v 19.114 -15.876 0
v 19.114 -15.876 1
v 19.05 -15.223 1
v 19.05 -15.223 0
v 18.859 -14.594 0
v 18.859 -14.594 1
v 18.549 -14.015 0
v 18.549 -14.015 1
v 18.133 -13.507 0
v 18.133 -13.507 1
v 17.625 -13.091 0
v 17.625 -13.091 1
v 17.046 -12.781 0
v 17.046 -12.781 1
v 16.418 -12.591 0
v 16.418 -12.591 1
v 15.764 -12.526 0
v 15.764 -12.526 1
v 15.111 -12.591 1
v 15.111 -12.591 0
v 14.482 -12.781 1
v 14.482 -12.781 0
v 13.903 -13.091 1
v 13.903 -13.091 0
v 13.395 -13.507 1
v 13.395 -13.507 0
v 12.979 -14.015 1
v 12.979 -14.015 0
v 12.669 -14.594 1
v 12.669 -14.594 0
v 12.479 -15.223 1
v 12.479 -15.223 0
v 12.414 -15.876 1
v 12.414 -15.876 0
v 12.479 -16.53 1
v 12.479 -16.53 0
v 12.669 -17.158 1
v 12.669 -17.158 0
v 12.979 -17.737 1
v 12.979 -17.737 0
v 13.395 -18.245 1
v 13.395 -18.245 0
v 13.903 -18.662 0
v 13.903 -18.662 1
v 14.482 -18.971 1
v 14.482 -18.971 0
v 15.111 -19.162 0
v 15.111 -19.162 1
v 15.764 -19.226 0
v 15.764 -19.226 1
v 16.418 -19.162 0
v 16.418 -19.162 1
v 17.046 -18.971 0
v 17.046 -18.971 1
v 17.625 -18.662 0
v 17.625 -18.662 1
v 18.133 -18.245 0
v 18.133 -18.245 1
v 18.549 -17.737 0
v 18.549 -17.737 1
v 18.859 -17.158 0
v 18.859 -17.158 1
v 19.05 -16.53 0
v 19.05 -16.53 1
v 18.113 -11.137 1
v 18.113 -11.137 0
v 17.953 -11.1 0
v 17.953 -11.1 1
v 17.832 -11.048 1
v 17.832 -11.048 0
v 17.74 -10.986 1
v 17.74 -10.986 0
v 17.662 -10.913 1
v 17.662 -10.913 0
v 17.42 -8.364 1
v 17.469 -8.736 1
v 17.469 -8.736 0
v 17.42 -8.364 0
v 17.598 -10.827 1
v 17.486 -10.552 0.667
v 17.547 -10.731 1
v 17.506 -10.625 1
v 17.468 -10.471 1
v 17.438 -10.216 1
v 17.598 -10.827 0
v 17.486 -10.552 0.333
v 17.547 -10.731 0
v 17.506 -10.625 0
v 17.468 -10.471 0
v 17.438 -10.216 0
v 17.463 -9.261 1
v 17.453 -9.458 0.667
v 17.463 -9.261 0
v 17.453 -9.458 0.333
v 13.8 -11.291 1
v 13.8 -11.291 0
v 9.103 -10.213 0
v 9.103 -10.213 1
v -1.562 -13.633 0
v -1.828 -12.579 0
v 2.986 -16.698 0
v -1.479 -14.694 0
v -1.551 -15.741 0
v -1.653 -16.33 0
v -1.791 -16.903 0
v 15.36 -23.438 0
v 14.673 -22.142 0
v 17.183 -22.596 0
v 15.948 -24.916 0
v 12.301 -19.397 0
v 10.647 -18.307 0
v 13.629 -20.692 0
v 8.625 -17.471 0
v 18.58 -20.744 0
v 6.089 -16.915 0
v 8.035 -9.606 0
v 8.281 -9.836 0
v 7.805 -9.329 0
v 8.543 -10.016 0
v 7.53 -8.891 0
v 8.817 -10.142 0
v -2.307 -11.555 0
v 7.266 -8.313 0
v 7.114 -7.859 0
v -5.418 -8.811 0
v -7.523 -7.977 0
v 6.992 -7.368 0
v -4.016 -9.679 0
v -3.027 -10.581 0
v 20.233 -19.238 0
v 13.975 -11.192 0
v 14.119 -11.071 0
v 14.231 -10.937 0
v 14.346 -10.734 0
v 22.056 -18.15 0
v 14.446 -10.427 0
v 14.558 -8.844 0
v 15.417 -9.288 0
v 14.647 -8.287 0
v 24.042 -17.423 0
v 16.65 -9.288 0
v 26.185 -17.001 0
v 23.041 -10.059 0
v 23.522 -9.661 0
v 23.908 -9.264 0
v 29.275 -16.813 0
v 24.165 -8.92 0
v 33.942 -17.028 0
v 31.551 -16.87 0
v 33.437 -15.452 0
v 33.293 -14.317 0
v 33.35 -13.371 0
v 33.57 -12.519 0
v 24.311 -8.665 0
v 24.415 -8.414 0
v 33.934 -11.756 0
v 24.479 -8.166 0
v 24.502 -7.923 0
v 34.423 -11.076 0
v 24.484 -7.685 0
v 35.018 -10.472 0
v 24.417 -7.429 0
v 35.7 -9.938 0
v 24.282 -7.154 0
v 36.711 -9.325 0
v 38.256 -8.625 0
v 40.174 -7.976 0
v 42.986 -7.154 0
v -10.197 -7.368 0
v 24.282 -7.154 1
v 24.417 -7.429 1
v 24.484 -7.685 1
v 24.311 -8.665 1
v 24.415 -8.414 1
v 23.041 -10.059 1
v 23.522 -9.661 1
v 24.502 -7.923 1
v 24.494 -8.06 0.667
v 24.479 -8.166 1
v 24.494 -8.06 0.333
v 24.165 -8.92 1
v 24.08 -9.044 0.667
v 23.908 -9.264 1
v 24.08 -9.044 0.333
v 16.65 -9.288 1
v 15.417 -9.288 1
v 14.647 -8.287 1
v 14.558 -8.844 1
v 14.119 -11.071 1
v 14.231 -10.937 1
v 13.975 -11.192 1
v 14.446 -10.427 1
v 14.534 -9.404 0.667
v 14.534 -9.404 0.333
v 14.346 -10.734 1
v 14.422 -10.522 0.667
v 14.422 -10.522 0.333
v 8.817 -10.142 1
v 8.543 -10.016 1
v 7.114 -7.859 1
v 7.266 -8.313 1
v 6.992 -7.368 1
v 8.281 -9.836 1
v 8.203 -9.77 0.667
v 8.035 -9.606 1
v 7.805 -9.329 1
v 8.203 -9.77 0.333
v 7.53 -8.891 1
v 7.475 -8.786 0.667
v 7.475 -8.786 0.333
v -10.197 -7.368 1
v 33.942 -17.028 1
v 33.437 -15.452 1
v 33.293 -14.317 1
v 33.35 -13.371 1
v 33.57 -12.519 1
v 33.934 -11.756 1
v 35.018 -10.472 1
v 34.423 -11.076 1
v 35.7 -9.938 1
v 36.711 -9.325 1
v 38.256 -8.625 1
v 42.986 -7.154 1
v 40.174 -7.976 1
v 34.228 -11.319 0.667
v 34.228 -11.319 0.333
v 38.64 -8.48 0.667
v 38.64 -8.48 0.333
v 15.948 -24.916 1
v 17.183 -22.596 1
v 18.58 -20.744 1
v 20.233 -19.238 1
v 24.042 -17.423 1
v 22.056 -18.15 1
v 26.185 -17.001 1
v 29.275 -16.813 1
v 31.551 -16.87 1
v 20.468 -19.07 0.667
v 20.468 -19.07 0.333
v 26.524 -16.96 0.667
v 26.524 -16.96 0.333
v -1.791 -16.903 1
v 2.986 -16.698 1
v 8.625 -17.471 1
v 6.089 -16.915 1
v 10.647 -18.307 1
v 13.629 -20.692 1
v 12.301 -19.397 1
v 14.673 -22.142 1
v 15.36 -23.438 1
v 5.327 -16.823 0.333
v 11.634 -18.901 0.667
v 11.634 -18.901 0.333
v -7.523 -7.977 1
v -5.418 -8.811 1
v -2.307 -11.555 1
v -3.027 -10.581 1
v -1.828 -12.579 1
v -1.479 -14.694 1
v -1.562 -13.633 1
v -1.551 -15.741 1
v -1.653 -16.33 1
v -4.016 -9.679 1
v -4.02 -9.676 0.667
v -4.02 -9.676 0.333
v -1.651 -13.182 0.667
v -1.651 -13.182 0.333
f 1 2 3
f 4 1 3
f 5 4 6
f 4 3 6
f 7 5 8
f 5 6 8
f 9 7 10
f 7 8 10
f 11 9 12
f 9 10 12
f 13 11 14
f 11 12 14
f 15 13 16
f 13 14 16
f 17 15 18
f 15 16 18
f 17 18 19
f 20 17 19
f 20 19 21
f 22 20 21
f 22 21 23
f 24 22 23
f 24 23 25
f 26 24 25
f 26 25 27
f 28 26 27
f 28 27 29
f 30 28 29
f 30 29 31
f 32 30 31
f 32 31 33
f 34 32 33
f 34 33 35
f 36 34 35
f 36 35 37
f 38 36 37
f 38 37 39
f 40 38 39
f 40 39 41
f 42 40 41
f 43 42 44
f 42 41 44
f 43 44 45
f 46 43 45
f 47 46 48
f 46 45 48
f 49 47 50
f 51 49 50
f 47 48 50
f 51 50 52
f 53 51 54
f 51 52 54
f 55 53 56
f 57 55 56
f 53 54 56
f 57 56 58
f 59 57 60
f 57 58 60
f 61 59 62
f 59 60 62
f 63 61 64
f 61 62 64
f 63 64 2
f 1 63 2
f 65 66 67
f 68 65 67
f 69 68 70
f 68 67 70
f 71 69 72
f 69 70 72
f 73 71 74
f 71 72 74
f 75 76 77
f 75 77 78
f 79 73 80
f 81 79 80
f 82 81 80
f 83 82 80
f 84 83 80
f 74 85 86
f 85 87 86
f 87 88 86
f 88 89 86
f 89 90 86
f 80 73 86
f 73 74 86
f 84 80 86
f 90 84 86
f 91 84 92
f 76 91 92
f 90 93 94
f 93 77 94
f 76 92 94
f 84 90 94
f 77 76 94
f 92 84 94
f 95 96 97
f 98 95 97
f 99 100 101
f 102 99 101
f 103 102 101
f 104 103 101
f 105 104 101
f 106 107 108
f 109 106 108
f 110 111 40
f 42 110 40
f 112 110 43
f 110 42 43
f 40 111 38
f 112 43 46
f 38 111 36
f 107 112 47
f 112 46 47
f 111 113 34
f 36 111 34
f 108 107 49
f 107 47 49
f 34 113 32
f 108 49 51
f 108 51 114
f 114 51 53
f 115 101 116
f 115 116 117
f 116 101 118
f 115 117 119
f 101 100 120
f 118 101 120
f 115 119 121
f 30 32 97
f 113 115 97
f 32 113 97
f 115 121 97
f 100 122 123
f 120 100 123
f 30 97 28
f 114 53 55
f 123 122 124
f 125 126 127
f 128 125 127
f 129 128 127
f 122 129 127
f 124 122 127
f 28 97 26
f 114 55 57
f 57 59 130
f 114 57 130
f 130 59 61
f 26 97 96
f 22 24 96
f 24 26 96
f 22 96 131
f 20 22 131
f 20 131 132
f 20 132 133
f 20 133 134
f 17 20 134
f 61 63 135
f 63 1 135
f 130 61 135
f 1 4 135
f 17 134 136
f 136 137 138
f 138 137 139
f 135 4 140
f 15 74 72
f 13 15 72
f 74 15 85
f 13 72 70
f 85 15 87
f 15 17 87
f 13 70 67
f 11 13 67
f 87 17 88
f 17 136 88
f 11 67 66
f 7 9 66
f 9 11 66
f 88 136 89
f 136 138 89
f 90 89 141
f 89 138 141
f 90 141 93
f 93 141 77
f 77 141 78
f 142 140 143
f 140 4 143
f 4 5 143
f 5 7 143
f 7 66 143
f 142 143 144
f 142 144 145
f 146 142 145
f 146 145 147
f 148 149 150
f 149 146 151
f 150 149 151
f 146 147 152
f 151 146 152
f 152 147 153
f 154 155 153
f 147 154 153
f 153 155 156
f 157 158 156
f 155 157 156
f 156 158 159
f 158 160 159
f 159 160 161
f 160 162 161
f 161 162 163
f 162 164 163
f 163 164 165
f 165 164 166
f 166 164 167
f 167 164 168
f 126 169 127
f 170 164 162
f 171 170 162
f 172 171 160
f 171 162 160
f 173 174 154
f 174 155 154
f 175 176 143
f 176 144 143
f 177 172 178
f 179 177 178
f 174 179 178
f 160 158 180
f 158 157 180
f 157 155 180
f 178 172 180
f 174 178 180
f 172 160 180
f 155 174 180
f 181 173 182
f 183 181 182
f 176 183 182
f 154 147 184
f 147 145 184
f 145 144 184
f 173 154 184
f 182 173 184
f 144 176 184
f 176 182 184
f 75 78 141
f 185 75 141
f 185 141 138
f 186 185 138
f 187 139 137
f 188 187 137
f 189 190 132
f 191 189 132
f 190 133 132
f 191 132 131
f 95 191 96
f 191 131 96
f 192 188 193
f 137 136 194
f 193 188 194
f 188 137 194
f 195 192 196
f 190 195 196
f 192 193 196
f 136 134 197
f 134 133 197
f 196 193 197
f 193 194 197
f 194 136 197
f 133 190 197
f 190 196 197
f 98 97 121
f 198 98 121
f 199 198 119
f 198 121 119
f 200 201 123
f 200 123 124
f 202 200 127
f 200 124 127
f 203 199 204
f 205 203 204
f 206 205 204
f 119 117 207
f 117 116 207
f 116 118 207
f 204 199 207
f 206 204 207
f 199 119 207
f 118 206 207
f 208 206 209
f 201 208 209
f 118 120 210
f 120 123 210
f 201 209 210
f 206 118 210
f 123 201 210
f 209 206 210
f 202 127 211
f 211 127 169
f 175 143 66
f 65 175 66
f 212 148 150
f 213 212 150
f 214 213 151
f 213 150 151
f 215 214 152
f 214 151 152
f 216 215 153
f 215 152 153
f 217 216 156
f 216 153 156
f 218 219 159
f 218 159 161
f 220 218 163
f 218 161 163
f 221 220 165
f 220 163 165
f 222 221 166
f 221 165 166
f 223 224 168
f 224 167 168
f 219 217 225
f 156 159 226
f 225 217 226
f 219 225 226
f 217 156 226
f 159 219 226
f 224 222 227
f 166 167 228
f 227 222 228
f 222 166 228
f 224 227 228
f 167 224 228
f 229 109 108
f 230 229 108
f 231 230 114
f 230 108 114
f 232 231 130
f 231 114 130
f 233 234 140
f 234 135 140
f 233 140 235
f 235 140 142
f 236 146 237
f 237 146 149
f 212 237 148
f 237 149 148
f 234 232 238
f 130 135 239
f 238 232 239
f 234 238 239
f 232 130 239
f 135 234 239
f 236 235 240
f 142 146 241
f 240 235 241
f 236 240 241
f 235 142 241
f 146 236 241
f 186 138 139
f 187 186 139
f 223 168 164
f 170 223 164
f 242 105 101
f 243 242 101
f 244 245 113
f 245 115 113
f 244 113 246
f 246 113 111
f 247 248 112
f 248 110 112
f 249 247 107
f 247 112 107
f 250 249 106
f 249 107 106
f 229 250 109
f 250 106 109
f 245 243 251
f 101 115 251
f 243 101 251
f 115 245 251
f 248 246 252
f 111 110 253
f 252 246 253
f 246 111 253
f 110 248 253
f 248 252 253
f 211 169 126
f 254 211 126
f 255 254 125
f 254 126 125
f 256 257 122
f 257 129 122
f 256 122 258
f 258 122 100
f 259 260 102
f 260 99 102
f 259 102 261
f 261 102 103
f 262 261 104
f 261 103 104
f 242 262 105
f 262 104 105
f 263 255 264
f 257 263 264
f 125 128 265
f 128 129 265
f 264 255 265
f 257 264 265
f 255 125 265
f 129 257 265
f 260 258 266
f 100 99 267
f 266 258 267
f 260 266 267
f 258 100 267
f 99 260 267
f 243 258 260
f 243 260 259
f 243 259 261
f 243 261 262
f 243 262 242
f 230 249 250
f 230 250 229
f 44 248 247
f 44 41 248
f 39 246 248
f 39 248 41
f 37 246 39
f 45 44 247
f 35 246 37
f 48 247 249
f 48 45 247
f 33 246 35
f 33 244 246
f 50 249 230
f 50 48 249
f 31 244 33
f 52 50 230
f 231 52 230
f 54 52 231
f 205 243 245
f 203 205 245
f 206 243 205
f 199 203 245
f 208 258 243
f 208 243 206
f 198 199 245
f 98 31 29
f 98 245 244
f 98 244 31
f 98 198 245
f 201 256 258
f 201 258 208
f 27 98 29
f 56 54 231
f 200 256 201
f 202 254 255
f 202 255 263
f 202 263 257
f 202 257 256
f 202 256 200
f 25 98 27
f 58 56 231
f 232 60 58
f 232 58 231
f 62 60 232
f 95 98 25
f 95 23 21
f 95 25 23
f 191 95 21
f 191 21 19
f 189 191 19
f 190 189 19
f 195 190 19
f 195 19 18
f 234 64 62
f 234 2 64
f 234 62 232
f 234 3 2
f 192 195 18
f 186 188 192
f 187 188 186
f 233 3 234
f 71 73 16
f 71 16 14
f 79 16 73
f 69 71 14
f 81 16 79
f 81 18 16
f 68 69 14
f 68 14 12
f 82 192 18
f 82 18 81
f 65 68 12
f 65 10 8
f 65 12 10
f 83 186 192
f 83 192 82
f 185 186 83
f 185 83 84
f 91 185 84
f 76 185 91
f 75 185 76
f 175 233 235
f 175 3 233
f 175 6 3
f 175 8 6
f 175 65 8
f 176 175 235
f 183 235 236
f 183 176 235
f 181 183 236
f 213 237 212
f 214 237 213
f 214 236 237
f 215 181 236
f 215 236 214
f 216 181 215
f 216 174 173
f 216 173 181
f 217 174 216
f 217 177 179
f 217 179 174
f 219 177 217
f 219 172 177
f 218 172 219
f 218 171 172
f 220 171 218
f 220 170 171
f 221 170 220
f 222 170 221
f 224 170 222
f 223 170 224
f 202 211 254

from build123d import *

# Parameters (mm, degrees)
F2_DEPTH = 1
F3_T     = -1
F4_R     = 3.349925
F5_DEPTH = 25.4


with BuildPart() as f2:
    # F1 (on Top) → F2 (new body)
    with BuildSketch(Plane.XY):
        with BuildLine():
            Line((13.80021, -11.290746), (9.102559, -10.212597))
            add(Edge.make_bspline(
                [(9.102559, -10.212597), (8.142358, -10.075296), (7.32683, -8.968351), (6.992009, -7.368016)],
                knots=[0, 0, 0, 0, 3.542042, 3.542042, 3.542042, 3.542042], degree=3))
            Line((6.992009, -7.368016), (-10.196833, -7.368016))
            add(Edge.make_bspline(
                [(-10.196833, -7.368016), (-1.683224, -8.74827), (-0.829401, -13.403604), (-1.790936, -16.902696)],
                knots=[0, 0, 0, 0, 12.710989, 12.710989, 12.710989, 12.710989], degree=3))
            add(Edge.make_bspline(
                [(-1.790936, -16.902696), (5.33876, -16.336972), (13.023932, -16.339568), (15.948245, -24.916124)],
                knots=[0, 0, 0, 0, 19.465189, 19.465189, 19.465189, 19.465189], degree=3))
            add(Edge.make_bspline(
                [(15.948245, -24.916124), (19.640299, -16.68267), (25.902187, -16.389608), (33.941839, -17.028365)],
                knots=[0, 0, 0, 0, 19.64653, 19.64653, 19.64653, 19.64653], degree=3))
            add(Edge.make_bspline(
                [(33.941839, -17.028365), (30.768488, -9.431371), (40.071145, -8.176144), (42.985801, -7.154439)],
                knots=[0, 0, 0, 0, 13.389834, 13.389834, 13.389834, 13.389834], degree=3))
            Line((42.985801, -7.154439), (24.282036, -7.154439))
            add(Edge.make_bspline(
                [(24.282036, -7.154439), (24.807367, -8.005574), (24.392679, -9.044486), (23.041492, -10.058575)],
                knots=[0, 0, 0, 0, 3.157999, 3.157999, 3.157999, 3.157999], degree=3))
            Line((23.041492, -10.058575), (18.112808, -11.136725))
            add(Edge.make_bspline(
                [(18.112808, -11.136725), (16.990187, -10.975688), (17.650745, -9.288468), (17.419713, -8.36434)],
                knots=[0, 0, 0, 0, 2.857708, 2.857708, 2.857708, 2.857708], degree=3))
            Line((17.419713, -8.36434), (16.649606, -9.288468))
            Line((16.649606, -9.288468), (15.417434, -9.288468))
            Line((15.417434, -9.288468), (14.647327, -8.28733))
            add(Edge.make_bspline(
                [(14.647327, -8.28733), (14.364955, -9.288469), (14.845224, -10.811385), (13.80021, -11.290746)],
                knots=[0, 0, 0, 0, 3.120595, 3.120595, 3.120595, 3.120595], degree=3))
        make_face()
    extrude(amount=F2_DEPTH)

    # F3
    f3_openings = [f2.faces().sort_by_distance(p)[0] for p in [
        (16.284264, -13.143968, 1),
    ]]
    offset(amount=F3_T, openings=f3_openings)

    # F4 (on face) → F5 (cut)
    with BuildSketch(Plane.XY.offset(1)):
        with Locations((15.764091, -15.87615)):
            Circle(F4_R)
    extrude(amount=-F5_DEPTH, mode=Mode.SUBTRACT)


solid = f2.part
